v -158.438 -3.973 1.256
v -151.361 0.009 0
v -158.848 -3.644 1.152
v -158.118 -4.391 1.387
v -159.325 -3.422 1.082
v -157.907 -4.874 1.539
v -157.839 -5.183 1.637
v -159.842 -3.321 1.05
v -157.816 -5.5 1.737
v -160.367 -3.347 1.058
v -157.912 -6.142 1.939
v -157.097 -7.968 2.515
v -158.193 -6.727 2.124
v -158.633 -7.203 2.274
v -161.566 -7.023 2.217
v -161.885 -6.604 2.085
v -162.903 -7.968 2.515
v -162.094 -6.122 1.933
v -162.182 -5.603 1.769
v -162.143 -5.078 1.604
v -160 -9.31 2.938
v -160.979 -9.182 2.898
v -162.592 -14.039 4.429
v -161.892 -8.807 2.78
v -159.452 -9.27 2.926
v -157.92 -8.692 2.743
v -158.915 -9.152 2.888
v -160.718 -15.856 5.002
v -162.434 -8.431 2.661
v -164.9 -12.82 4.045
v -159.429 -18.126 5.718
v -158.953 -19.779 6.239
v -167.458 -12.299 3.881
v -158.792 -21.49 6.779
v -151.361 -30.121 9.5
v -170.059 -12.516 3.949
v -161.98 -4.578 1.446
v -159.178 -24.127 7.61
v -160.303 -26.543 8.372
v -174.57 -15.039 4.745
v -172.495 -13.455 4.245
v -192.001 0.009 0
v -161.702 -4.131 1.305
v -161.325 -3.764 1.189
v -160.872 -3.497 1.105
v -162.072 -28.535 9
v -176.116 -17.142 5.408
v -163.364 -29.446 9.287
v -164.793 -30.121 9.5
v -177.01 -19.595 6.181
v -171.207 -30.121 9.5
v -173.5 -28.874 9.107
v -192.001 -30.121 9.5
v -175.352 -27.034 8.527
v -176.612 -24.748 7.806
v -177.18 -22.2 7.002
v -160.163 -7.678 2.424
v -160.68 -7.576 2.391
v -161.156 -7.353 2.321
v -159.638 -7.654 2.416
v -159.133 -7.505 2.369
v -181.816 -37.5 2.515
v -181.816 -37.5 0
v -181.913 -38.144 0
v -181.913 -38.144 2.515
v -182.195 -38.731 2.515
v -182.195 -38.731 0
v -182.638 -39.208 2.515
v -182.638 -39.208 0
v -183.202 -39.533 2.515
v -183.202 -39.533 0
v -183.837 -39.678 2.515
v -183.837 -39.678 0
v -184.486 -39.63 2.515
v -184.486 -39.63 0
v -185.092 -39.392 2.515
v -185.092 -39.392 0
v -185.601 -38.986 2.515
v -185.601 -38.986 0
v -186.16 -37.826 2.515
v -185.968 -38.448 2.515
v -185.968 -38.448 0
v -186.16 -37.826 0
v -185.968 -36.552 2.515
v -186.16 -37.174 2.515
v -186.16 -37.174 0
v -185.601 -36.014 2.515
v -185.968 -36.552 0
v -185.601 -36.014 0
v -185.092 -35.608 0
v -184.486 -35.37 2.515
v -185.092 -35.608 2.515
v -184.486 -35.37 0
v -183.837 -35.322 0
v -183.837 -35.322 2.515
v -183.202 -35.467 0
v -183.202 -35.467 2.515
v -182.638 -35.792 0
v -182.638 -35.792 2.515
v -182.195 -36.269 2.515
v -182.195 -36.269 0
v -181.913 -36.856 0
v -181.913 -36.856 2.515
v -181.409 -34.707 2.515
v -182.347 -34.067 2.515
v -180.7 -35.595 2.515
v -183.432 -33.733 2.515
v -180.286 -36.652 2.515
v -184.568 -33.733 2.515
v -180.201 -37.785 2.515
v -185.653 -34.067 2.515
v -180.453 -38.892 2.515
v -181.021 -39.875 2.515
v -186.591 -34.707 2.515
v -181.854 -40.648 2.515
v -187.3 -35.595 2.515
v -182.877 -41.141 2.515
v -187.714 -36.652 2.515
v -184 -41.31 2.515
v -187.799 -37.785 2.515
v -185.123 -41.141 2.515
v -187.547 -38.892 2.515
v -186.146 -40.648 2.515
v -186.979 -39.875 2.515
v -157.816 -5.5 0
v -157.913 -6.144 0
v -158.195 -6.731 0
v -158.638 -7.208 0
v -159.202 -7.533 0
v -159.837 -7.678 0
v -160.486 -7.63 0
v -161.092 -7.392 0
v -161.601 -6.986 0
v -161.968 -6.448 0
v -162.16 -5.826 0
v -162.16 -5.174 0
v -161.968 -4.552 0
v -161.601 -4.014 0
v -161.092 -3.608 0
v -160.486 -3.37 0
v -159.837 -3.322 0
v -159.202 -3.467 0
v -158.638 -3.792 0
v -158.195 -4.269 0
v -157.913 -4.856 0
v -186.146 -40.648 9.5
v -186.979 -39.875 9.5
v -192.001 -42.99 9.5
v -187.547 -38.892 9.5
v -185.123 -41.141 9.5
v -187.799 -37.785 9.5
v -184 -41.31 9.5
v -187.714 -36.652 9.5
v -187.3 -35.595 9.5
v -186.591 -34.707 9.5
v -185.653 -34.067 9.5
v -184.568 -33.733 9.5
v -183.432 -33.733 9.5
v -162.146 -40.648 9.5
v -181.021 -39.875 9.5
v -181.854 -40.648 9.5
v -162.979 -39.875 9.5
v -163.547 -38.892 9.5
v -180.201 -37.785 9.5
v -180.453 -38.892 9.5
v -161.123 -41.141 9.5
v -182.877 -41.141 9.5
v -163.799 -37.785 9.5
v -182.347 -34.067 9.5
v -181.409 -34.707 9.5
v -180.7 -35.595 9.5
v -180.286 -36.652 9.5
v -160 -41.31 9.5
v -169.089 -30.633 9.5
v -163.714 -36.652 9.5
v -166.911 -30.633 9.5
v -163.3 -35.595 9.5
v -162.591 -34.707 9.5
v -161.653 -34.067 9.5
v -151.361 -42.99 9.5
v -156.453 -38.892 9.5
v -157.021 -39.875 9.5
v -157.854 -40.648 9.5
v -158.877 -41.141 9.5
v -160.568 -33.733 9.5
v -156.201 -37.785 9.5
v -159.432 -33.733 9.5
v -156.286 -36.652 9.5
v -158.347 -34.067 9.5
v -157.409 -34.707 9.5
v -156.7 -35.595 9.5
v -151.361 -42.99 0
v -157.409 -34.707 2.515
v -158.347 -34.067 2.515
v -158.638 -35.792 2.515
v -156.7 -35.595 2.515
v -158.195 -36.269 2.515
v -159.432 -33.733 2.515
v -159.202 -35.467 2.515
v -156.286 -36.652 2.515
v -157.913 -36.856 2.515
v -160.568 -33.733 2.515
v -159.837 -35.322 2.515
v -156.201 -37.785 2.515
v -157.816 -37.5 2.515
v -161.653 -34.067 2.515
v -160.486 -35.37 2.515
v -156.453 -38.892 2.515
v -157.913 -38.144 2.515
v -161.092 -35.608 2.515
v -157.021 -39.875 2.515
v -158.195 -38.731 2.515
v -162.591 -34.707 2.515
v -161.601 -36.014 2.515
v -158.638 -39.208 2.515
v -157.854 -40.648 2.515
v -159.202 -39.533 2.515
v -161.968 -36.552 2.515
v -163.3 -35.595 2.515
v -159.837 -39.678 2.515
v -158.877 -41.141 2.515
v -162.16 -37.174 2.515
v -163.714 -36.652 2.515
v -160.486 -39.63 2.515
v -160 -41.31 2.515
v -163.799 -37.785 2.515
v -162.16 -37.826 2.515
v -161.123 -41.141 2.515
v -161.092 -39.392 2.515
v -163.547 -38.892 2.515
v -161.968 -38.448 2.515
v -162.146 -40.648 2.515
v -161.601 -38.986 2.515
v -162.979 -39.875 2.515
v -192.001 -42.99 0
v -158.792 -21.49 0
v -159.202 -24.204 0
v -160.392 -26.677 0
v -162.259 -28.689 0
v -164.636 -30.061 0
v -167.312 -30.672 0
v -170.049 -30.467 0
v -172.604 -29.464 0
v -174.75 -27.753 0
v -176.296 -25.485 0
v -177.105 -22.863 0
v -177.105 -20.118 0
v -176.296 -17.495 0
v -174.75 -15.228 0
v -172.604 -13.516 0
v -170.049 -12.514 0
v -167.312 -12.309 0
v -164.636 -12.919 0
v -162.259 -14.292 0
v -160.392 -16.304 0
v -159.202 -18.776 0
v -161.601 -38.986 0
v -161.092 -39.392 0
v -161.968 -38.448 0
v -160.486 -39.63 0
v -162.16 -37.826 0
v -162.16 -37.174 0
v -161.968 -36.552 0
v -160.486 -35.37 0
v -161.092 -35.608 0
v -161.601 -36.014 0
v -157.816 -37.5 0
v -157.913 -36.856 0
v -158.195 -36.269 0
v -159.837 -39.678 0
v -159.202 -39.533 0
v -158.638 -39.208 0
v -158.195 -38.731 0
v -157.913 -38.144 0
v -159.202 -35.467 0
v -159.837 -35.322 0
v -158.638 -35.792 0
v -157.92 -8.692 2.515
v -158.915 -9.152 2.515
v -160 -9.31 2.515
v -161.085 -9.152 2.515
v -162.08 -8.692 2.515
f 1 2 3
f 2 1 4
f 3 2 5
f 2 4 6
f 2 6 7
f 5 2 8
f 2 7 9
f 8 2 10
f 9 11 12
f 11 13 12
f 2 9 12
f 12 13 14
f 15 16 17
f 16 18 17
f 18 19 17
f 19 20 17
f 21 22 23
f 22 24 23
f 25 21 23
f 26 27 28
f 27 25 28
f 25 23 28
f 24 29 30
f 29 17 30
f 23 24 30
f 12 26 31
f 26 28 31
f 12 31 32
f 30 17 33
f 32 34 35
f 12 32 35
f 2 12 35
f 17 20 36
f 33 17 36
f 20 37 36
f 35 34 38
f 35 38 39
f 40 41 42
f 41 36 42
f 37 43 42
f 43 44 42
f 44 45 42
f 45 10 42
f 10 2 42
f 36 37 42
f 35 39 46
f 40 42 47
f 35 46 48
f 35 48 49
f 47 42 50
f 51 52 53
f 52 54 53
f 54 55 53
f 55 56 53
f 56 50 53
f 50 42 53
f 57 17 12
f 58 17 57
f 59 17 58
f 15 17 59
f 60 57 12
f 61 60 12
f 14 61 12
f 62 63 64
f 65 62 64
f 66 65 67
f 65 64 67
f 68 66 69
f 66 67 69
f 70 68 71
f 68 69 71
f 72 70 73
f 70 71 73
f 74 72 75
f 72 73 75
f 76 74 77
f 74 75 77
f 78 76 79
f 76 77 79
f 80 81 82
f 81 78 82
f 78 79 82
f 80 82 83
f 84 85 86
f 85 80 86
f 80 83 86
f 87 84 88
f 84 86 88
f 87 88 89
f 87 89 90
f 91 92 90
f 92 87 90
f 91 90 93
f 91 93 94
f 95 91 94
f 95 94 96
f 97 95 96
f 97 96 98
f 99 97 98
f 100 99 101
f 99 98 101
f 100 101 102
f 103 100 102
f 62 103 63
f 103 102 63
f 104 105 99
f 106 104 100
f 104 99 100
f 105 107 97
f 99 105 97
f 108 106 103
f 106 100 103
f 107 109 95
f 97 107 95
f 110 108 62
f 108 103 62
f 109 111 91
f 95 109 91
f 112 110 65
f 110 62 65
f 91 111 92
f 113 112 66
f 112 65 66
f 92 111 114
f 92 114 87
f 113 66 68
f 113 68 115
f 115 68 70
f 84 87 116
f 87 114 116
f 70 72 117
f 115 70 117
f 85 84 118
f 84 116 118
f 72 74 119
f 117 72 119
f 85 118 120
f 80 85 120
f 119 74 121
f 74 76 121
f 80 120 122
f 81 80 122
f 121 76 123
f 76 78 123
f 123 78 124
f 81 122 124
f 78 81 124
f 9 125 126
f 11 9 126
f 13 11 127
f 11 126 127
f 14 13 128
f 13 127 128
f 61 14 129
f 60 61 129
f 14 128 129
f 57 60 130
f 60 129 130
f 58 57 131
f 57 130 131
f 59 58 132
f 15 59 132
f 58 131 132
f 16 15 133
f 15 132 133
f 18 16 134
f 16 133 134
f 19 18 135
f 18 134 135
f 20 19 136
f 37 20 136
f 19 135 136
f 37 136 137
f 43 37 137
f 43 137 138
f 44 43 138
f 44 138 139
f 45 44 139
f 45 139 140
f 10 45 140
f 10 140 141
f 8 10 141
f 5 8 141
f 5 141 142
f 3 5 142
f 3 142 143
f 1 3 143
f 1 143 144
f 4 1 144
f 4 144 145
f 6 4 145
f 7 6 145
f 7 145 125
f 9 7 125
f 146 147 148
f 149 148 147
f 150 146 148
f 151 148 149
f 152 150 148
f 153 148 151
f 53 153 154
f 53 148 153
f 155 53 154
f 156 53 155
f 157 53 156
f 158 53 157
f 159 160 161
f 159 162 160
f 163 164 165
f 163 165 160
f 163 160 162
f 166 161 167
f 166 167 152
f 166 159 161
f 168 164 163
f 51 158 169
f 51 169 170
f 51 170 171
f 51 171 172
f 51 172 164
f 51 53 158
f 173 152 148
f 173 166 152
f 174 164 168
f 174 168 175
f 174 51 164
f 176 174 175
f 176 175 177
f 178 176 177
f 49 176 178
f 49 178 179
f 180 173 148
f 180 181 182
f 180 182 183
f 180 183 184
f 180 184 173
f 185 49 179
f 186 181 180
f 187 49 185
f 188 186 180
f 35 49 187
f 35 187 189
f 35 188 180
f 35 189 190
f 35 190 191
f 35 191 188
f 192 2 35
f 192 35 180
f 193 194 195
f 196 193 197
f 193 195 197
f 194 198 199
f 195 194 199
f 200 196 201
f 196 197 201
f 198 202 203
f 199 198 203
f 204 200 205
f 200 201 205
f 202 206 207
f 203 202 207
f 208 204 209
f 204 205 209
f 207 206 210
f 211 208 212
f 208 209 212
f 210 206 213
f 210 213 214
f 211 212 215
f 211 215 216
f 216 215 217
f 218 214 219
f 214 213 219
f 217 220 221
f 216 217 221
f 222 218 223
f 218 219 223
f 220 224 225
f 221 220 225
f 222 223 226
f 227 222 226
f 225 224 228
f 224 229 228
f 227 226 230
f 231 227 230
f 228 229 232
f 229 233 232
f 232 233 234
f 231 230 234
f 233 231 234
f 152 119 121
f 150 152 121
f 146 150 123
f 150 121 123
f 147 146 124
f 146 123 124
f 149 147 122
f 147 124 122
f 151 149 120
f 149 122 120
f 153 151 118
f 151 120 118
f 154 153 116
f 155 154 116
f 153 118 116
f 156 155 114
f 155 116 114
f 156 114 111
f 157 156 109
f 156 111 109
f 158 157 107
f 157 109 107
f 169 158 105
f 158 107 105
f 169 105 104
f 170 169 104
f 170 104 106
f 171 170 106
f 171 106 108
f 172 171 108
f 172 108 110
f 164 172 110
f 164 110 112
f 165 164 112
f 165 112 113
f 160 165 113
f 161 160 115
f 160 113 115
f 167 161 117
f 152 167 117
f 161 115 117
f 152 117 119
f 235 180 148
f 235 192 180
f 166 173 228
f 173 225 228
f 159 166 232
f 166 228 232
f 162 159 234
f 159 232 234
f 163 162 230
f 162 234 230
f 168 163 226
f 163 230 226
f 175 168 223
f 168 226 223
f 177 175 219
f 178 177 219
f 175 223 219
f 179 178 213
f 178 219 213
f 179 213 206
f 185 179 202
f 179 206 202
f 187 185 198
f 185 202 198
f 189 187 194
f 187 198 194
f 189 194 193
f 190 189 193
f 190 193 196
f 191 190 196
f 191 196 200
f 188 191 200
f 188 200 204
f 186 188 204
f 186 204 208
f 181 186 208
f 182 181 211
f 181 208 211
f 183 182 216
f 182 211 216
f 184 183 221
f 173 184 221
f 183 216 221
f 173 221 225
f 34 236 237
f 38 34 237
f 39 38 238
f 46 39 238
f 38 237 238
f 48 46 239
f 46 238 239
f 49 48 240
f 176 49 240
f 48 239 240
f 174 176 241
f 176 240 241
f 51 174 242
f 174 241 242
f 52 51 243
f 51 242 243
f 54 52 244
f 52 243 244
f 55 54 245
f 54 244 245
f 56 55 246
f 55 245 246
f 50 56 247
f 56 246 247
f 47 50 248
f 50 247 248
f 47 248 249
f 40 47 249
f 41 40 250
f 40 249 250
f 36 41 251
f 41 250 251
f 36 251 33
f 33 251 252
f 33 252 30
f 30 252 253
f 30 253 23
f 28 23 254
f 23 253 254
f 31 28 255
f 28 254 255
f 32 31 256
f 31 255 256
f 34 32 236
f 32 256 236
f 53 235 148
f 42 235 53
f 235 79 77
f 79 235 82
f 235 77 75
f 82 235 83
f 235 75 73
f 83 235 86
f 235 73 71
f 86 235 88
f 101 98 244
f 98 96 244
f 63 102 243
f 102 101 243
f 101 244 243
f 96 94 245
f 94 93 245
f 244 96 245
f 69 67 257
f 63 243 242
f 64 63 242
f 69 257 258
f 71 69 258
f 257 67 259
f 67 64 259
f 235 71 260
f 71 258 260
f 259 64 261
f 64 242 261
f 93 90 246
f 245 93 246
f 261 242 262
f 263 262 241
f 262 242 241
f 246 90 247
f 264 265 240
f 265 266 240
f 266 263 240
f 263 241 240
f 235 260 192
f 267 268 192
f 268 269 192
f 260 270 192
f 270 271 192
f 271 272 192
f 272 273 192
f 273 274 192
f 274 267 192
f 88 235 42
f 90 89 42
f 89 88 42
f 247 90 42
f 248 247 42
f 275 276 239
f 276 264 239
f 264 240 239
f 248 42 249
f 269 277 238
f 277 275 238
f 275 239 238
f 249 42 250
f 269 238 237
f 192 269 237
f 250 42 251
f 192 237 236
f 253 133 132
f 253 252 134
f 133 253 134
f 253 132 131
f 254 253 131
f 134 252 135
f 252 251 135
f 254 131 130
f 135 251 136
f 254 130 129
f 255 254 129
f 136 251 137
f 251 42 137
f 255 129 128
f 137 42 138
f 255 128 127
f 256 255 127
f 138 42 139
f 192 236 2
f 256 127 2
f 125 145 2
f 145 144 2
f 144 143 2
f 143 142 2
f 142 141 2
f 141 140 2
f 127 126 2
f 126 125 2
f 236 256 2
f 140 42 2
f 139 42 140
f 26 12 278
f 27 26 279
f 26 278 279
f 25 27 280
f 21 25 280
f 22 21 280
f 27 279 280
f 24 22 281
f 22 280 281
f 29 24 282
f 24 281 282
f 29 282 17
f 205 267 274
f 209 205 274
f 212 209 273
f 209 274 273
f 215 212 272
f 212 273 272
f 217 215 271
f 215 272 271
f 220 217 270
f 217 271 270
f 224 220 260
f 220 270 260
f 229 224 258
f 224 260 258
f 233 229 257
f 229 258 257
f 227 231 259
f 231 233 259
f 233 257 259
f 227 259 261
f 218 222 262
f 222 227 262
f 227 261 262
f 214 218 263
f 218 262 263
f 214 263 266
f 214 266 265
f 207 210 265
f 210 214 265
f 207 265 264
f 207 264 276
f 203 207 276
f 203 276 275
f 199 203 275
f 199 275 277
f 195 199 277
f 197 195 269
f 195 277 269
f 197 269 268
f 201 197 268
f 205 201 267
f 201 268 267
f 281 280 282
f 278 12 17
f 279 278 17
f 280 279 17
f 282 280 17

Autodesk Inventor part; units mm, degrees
ref_plane "Work Plane1" through (0, -45.5, -2.5) normal (0, 0, -1) x (-1, 0, 0)
ref_plane "Work Plane2" through (0, 0, 0) normal (0, 0, 1) x (1, 0, 0)
sketch "Sketch2" plane through (0, 0, 0) normal (0, 0, 1) x (1, 0, 0)
  line L0 (-191.9993, -42.9912) -> (0.0007, -42.9846) construction
  line L1 (-192.0007, 0.0088) -> (0, 0.0154) construction
  line L2 (-192.0007, 0.0088) -> (-191.9993, -42.9912) construction
  circle A0 centre (-168, -21.4904) radius 7.975 construction
  line L3 (-192.0007, 0.0088) -> (-151.3607, 0.0088)
  line L4 (-151.3607, 0.0088) -> (-151.3607, -42.9898)
  line L5 (-151.3607, -42.9898) -> (-192.0007, -42.9898)
  line L6 (-192.0007, -42.9898) -> (-192.0007, 0.0088)
  circle A1 centre (-168, -21.4904) radius 9.2075
  circle A2 centre (-160, -5.5) radius 2 construction
  circle A3 centre (-160, -37.5) radius 2 construction
  circle A4 centre (-160, -5.5) radius 2.1844
  circle A5 centre (-160, -37.5) radius 2.1844
  circle A6 centre (-184, -37.5) radius 2 construction
  circle A7 centre (-184, -37.5) radius 2.1844
  point P0 (0, 0)
  dimension "d0" = 40.64
  dimension "d1" = 18.415
  dimension "d5" = 4.3688
  dimension "d6" = 4.3688
  dimension "d9" = 4.3688
ref_plane "Work Plane3" through (-192, -45.5, 9.5) normal (0, 0, 1) x (1, 0, 0)
ref_plane "Work Plane4" through (-192, -45.5, 9.5) normal (0, 0, 1) x (1, 0, 0)
ref_plane "Work Plane5" through (-192, 0, 9.5) normal (0, 0, 1) x (1, 0, 0)
extrude "Extrusion3" add sketch "Sketch2" along normal up to surface (9.5 mm away)
sketch "Sketch3" plane through (-192.0007, 0.0088, 9.5) normal (0, 0, 1) x (1, 0, 0)
  circle A0 centre (8.0007, -37.5088) radius 2.1844 projected
  circle A1 centre (32.0007, -37.5088) radius 2.1844 projected
  circle A2 centre (32.0007, -5.5088) radius 2.1844 projected
  point P0 (192.0007, -0.0088)
hole "Hole1" at (-184, -37.5, 9.5) at (-160, -37.5, 9.5) at (-160, -5.5, 9.5) direction (0, 0, -1) diameter 4.3688 end through all counterbore diameter 7.62 counterbore depth 6.985
sketch "Sketch6" plane through (-192.0007, -42.9898, 0) normal (-1, 0, 0) x (0, 0, 1)
  line L0 (4.3851, 29.7217) -> (2.7047, 35.051) construction
  line L1 (0, 42.9986) -> (0, 0) projected
  line L2 (0, 42.9986) -> (9.5, 12.8685)
  line L3 (9.5, 42.9986) -> (9.5, 0) projected
  line L4 (0, 42.9986) -> (31.5923, 42.9986) construction
  line L5 (9.5, 12.8685) -> (9.5, 42.9986)
  line L6 (0, 42.9986) -> (9.5, 42.9986) projected
  line L7 (9.5, 42.9986) -> (0, 42.9986)
  point P0 (0, 42.9898)
  dimension "d23" = 72.5
extrude "Extrusion5" cut sketch "Sketch6" against normal through all
properties part number "BallCasterMountTemp"
